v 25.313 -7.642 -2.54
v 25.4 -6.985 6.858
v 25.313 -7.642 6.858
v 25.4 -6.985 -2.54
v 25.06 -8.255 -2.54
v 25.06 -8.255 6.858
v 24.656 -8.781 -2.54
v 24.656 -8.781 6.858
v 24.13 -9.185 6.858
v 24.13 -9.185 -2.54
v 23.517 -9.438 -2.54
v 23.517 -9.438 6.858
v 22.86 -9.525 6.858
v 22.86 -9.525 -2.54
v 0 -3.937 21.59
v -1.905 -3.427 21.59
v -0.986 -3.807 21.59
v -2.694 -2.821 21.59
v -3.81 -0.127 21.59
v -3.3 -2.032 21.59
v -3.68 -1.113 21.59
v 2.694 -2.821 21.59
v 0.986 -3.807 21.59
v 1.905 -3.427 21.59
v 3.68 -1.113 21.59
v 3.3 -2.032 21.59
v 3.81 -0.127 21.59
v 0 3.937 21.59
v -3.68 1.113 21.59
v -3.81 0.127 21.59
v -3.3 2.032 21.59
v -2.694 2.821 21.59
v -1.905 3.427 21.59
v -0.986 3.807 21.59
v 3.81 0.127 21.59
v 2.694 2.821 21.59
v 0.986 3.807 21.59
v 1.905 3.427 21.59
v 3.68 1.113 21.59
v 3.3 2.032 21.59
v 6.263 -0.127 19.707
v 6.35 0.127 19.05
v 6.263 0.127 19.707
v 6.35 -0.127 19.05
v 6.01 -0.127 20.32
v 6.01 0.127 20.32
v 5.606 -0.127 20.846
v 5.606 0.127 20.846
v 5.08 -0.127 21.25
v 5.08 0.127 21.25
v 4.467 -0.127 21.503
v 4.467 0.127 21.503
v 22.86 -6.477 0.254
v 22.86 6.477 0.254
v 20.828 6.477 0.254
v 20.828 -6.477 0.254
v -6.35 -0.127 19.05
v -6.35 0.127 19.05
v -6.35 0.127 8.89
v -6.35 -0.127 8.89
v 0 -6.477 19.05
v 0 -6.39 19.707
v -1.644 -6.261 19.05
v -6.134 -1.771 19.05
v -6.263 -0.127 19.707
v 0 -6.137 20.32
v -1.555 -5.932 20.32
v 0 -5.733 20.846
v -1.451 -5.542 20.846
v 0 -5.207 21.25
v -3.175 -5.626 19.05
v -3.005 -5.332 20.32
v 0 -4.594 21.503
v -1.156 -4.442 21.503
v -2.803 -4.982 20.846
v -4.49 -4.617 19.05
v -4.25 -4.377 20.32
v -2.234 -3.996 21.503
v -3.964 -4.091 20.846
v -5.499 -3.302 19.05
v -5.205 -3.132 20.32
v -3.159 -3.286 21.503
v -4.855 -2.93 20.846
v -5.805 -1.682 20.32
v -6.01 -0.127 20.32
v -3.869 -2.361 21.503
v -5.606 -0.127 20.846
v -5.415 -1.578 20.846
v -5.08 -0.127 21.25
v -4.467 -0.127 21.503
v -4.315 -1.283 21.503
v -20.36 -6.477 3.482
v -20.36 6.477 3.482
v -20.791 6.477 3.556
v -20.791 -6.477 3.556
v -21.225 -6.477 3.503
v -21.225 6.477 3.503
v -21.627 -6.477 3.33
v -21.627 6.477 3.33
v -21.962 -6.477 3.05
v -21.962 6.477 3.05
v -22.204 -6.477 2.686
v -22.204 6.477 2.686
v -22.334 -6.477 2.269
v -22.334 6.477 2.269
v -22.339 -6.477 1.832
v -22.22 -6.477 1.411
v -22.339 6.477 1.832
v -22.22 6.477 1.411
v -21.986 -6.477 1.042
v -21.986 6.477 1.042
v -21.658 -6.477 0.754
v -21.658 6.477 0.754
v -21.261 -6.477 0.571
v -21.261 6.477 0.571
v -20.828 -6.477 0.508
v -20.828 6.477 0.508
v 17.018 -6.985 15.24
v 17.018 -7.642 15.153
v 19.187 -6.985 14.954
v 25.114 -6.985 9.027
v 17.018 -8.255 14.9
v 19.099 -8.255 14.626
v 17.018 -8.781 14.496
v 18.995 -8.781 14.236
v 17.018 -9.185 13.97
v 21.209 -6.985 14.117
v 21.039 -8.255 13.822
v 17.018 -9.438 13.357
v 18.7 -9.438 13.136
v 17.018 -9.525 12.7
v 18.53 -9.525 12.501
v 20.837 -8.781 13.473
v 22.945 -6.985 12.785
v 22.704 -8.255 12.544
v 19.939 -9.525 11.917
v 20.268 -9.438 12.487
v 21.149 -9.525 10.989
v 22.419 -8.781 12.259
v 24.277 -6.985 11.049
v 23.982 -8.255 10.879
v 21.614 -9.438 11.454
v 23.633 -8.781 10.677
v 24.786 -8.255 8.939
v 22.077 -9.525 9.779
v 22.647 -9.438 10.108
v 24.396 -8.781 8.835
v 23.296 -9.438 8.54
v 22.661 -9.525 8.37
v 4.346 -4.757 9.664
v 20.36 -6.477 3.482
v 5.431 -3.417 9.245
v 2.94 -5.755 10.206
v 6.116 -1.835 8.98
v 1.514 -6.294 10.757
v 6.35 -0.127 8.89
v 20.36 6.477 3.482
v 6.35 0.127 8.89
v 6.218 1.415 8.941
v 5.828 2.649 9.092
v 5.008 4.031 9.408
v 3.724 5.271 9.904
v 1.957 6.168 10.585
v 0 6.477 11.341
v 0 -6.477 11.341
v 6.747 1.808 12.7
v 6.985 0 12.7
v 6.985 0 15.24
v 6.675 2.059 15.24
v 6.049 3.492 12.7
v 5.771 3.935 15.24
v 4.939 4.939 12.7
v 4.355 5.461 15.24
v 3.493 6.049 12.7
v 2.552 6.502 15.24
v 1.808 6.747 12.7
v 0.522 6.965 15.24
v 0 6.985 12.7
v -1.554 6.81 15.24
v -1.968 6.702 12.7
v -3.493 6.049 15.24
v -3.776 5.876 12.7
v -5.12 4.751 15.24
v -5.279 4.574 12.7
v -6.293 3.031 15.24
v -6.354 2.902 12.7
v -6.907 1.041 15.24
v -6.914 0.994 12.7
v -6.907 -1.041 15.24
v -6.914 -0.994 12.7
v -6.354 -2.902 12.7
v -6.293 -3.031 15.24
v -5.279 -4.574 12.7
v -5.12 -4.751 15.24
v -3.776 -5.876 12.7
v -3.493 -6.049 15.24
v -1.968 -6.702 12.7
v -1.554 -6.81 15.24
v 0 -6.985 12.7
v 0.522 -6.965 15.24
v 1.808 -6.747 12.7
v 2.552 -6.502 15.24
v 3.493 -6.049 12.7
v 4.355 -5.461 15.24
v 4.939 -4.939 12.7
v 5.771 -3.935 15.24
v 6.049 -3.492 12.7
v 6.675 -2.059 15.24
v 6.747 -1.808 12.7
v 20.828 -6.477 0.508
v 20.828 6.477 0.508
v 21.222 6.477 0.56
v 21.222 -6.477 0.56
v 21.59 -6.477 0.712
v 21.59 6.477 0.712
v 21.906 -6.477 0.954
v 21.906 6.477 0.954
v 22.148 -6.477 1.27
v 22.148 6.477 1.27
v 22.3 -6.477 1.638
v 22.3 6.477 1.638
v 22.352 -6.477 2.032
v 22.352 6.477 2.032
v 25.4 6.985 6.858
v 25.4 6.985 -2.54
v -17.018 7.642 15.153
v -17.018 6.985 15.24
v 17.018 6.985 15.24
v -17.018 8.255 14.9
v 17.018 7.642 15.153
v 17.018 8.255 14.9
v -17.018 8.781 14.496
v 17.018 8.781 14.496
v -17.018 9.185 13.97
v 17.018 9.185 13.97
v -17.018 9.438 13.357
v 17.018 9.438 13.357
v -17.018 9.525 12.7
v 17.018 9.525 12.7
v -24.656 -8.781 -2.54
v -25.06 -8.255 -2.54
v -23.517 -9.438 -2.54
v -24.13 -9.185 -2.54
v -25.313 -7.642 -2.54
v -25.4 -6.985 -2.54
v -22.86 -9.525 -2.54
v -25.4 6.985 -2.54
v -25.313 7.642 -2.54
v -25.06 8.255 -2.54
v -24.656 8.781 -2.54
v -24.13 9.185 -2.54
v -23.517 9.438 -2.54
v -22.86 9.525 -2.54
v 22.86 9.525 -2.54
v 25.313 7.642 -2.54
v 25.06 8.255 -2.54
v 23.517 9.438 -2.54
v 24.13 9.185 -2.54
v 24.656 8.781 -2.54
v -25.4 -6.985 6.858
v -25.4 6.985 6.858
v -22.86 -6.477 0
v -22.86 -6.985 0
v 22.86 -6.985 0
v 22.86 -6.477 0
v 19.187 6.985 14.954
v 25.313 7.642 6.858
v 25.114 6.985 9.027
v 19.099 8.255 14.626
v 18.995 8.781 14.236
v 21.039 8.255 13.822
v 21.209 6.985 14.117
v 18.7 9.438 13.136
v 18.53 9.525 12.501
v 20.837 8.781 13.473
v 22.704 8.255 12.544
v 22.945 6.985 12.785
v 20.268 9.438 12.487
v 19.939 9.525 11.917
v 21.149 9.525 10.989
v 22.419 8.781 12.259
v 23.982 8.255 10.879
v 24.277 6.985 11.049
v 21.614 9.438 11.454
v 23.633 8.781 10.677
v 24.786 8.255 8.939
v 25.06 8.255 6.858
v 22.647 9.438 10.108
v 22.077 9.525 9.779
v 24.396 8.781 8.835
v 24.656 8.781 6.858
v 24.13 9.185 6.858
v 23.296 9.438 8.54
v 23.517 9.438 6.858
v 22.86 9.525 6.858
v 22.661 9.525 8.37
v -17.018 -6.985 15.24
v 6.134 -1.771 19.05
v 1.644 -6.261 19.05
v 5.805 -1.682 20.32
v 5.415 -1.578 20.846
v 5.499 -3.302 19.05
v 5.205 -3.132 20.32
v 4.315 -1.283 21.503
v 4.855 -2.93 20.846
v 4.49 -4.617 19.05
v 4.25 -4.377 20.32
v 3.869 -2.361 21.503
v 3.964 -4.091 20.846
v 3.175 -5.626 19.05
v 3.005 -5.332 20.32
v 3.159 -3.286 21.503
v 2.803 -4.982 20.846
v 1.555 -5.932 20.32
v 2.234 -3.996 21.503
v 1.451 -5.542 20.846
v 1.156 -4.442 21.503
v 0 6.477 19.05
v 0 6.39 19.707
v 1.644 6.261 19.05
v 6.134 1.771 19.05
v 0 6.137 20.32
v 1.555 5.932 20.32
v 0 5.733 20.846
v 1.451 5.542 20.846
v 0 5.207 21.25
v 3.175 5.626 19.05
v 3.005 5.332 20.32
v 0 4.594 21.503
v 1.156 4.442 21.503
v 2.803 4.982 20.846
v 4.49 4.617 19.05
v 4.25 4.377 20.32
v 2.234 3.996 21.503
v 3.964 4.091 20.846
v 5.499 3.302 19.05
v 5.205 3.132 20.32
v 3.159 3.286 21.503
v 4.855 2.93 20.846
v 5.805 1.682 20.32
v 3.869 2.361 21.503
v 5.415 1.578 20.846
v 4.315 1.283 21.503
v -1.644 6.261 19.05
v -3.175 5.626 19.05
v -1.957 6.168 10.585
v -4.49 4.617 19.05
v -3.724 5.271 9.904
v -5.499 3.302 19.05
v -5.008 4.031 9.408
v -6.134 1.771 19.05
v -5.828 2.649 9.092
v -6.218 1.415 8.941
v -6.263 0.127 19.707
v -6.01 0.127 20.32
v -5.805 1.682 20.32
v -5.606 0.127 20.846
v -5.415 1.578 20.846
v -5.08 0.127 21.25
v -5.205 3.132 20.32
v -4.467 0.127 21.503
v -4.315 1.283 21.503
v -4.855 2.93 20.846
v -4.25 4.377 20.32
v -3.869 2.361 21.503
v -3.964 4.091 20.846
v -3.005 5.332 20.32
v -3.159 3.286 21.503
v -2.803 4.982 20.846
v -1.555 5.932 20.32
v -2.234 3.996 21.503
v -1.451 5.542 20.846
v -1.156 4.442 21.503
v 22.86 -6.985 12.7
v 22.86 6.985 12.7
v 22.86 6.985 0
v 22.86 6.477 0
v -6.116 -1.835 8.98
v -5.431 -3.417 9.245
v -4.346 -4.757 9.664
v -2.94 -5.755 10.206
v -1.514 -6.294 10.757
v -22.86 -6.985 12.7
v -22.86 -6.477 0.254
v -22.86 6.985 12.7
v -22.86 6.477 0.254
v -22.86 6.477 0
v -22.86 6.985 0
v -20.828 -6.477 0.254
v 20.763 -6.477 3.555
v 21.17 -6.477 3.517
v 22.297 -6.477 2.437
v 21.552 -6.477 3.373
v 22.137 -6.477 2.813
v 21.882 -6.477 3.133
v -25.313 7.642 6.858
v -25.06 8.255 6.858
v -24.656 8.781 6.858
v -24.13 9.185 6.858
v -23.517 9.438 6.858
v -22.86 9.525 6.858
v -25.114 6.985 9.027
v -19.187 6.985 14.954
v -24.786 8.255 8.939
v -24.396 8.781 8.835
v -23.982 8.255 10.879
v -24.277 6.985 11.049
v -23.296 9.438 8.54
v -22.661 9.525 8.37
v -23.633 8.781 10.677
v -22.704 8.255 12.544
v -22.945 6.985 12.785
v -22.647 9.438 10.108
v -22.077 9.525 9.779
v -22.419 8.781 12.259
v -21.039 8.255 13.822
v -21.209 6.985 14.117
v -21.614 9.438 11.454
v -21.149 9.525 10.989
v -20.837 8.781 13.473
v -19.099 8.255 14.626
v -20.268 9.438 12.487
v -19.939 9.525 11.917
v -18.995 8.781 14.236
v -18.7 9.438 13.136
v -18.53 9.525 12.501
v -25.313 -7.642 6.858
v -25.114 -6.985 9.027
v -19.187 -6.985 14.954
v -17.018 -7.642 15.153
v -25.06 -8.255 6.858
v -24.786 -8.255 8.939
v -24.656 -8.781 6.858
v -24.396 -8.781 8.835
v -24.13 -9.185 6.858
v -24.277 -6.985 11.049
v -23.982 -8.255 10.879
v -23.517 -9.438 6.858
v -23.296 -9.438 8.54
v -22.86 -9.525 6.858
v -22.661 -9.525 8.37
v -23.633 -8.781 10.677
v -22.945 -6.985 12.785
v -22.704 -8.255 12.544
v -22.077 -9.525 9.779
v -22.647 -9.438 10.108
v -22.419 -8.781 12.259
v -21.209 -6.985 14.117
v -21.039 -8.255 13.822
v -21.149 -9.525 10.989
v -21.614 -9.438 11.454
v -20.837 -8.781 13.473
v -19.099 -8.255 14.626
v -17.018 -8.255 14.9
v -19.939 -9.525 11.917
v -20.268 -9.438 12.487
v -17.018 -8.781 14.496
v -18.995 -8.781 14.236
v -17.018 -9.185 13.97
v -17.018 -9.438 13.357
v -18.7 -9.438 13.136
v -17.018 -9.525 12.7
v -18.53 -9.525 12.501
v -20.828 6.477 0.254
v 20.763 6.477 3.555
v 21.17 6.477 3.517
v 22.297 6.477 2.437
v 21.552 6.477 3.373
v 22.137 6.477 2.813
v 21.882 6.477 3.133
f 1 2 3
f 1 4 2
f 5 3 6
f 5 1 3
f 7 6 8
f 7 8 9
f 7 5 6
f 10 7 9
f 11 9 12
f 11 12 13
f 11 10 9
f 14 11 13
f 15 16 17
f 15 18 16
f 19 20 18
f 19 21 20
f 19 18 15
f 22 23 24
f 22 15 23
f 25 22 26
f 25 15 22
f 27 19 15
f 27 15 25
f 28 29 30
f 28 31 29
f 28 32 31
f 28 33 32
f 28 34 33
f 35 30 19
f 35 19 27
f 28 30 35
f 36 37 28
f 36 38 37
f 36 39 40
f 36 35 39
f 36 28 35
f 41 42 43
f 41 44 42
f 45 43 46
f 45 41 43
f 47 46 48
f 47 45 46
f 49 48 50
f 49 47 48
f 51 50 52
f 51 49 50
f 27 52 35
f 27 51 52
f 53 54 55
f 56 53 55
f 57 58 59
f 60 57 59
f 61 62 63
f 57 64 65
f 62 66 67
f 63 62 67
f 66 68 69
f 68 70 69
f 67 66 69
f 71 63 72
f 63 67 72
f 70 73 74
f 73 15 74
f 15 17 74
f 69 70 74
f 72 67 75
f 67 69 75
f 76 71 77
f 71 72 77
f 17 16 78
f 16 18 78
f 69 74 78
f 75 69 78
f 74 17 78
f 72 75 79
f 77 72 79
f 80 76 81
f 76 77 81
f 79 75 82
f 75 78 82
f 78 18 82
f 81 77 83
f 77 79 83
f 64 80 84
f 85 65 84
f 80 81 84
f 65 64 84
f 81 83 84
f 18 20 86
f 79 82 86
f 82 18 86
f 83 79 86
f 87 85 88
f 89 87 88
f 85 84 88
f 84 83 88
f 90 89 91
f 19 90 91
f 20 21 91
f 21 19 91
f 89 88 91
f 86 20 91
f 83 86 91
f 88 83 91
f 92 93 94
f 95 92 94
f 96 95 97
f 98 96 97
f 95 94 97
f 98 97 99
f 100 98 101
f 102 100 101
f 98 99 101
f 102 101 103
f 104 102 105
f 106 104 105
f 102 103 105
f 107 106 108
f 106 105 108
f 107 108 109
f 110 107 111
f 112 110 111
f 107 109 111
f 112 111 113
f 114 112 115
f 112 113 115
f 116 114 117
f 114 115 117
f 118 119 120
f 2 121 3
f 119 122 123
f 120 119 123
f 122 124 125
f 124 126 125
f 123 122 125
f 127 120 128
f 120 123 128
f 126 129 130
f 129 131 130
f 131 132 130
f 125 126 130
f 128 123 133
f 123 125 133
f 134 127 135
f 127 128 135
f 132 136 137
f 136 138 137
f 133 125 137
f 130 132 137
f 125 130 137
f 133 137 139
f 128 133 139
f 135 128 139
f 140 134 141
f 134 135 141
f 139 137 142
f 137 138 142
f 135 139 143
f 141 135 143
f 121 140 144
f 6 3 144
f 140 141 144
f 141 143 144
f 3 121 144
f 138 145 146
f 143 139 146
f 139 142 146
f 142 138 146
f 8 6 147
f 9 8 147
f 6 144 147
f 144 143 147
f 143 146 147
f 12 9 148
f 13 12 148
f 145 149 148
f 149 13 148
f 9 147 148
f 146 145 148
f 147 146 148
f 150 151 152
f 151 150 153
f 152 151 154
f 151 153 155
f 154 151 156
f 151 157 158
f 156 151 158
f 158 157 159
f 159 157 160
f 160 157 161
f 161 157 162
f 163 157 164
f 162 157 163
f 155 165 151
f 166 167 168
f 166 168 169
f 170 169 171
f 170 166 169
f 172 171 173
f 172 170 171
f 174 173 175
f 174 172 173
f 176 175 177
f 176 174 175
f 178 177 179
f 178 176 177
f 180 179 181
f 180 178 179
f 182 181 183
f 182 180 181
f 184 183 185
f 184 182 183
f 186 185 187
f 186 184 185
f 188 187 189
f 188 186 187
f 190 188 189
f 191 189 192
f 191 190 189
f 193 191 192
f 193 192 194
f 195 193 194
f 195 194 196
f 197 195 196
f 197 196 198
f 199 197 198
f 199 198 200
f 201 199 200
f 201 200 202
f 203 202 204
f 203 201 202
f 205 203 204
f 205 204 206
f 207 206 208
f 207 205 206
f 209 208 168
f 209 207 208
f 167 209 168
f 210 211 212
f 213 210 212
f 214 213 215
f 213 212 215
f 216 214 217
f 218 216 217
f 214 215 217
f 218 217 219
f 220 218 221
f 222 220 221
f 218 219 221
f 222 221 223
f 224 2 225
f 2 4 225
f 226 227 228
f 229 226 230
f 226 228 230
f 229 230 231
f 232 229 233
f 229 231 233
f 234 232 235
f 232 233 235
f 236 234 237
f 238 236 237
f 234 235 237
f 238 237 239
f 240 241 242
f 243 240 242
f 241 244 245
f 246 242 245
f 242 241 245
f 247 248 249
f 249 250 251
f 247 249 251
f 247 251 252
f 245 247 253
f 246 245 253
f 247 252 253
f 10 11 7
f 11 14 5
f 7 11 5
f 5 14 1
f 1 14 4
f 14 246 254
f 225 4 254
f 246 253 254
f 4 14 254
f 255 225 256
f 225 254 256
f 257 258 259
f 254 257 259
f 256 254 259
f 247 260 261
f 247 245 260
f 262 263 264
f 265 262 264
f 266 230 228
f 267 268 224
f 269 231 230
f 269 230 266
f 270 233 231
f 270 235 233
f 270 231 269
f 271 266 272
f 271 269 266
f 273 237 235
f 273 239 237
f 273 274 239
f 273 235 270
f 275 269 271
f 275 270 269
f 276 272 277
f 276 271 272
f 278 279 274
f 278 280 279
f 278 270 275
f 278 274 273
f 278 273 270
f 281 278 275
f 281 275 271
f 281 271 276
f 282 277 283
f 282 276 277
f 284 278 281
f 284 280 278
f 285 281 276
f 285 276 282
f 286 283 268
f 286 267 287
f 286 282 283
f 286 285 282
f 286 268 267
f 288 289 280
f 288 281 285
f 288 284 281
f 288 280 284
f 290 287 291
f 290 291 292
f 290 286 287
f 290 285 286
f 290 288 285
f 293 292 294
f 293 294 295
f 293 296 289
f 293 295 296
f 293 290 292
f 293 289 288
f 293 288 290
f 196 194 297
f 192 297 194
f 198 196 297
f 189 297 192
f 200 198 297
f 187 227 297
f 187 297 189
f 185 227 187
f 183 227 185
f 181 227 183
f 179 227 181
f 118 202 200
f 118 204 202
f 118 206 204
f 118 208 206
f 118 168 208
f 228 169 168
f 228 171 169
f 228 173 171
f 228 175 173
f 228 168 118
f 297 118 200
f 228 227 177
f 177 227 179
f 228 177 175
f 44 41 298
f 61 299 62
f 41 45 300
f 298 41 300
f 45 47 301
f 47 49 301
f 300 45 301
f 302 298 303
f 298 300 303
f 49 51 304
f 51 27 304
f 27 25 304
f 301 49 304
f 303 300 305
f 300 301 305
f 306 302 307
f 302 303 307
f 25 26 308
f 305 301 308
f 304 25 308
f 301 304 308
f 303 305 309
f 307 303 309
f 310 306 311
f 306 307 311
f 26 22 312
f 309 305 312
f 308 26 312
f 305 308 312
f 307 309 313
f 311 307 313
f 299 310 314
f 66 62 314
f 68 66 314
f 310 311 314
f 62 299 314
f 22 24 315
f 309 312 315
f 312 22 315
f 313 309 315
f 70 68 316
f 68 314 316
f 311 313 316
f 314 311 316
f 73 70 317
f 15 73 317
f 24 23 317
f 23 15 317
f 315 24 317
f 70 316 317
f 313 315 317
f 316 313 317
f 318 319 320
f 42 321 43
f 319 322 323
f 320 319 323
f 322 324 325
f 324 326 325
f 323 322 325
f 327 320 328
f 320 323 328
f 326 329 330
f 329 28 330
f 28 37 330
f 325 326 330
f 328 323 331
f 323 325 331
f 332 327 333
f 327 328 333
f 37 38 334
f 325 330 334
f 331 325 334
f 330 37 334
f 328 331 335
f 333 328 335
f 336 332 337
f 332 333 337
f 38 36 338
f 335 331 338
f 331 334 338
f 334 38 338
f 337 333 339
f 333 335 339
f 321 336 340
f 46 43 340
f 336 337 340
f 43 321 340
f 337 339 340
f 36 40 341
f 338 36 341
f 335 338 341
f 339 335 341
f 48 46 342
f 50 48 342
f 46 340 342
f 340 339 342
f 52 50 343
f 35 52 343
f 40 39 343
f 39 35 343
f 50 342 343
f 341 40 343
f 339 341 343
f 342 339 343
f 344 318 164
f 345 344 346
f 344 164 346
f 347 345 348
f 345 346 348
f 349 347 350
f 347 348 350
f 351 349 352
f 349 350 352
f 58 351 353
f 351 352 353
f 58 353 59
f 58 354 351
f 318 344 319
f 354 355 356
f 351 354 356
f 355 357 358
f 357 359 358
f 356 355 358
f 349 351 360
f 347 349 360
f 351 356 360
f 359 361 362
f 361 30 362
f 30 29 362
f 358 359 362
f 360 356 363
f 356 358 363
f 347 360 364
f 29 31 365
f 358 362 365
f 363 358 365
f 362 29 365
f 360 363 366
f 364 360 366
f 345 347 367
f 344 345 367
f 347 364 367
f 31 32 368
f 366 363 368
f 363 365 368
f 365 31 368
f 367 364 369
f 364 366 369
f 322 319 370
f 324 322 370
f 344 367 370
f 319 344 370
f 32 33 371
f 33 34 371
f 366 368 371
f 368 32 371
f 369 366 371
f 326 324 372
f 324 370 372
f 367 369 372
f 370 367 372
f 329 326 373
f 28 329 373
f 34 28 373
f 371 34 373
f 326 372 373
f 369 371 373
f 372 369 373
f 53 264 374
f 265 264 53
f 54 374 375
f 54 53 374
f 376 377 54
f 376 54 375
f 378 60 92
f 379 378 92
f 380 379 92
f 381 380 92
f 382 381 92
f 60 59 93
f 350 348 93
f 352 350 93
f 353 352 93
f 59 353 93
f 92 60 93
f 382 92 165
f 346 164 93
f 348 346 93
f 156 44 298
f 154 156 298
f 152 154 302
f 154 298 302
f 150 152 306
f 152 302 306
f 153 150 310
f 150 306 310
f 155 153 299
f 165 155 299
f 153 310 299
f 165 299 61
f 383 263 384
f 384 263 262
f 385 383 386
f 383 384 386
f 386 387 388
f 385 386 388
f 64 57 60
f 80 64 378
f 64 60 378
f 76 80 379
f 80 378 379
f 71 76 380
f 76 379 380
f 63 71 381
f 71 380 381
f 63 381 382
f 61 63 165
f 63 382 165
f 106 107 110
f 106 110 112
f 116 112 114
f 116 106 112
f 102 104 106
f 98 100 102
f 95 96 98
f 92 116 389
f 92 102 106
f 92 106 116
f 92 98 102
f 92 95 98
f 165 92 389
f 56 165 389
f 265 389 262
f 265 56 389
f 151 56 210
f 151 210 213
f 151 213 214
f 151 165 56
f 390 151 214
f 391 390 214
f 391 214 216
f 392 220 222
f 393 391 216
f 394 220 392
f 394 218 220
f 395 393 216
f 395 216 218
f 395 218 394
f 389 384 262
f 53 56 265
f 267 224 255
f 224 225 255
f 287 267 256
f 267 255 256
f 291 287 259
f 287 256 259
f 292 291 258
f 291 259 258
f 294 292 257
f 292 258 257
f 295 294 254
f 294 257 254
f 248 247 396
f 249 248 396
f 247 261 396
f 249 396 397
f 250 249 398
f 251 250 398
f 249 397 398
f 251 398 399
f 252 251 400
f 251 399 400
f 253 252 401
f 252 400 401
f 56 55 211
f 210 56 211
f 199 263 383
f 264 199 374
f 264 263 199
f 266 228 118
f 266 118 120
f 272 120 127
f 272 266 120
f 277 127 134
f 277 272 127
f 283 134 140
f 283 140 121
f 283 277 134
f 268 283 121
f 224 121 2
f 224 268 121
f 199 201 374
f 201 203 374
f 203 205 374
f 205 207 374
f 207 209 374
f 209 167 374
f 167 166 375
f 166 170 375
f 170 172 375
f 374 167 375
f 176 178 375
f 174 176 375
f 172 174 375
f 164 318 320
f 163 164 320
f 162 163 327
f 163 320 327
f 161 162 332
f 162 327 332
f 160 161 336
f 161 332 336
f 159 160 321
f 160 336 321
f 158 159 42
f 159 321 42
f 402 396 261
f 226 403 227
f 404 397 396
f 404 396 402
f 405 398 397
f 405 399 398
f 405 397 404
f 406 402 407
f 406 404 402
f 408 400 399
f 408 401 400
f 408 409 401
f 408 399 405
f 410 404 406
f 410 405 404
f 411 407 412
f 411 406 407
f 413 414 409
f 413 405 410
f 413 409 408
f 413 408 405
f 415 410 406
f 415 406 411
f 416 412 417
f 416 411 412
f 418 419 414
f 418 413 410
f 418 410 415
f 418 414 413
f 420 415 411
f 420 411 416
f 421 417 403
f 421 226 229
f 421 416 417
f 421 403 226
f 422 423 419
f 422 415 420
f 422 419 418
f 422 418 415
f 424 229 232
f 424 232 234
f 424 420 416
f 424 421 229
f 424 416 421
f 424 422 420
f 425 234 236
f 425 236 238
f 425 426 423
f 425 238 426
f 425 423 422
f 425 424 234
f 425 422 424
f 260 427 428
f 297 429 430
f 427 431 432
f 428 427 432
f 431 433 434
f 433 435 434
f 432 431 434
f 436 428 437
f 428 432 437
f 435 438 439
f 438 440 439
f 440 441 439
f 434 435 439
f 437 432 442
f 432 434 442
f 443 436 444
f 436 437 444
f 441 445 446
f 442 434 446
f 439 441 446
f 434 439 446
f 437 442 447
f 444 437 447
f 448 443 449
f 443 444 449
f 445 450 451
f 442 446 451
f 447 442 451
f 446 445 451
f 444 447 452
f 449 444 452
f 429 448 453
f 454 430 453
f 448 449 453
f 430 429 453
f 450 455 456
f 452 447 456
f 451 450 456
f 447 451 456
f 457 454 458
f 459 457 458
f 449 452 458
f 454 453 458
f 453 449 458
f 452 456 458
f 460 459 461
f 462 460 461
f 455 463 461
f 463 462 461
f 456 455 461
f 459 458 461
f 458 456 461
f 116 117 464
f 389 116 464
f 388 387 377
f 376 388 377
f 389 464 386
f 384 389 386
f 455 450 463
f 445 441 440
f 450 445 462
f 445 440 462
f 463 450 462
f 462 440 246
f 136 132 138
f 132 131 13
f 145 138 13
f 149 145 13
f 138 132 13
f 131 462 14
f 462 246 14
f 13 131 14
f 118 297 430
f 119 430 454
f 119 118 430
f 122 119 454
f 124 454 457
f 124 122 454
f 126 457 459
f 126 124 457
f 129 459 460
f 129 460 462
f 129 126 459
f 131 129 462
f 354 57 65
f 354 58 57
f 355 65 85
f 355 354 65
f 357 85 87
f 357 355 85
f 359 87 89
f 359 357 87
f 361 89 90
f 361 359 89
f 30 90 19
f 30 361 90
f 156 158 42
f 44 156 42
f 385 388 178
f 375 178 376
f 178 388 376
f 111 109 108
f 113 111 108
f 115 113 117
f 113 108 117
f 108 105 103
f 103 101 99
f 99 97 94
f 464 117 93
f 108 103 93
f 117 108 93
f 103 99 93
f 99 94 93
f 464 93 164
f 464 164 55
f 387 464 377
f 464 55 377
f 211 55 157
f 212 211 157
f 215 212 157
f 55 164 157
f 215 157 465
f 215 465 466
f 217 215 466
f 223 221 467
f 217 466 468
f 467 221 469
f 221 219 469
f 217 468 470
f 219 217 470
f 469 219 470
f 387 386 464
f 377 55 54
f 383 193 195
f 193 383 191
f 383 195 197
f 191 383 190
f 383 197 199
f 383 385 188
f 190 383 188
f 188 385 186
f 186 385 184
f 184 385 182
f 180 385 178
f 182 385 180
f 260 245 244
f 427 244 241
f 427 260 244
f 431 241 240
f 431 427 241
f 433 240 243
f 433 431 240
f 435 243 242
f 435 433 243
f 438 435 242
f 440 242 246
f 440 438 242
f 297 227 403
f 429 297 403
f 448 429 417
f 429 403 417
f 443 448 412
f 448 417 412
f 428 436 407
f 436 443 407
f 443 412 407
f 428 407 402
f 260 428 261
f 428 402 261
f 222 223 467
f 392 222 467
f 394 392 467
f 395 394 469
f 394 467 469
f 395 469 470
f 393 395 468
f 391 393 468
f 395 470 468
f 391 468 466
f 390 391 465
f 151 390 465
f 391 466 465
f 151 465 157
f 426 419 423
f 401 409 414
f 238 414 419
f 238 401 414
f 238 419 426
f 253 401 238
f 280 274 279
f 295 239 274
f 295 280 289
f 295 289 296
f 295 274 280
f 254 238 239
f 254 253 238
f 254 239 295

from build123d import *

# Parameters (mm, degrees)
F0_W     = 50.8
F0_H     = 19.05
F0_W_2   = 45.72
F0_H_2   = 13.97
F1_DEPTH = 12.7
F2_W     = 50.8
F2_H     = 19.05
F3_DEPTH = 2.54
F5_START = 0.508
F4_W     = 4.572
F4_H     = 2.794
F4_W_2   = 12.7
F4_H_2   = 5.08
F4_H_3   = 3.81
F5_DEPTH = 12.954
F6_R     = 6.34999
F7_W     = 50.8
F7_H     = 19.05
F7_R     = 6.985
F8_DEPTH = 2.54
F9_R     = 2.54
F10_R    = 8.382
F11_R    = 2.54


# Not quite as in the source:
# - a fillet or chamfer is up to 0.001 mm smaller than in the source, because OpenCascade refuses the exact size


with BuildPart() as f1:
    # F0 (on Top) → F1 (new body)
    with BuildSketch(Plane.XY):
        Rectangle(F0_W, F0_H)
        Rectangle(F0_W_2, F0_H_2, mode=Mode.SUBTRACT)
    extrude(amount=F1_DEPTH)

    # F2 (on face) → F3 (join)
    with BuildSketch(Plane(origin=(0, 0, 0), x_dir=(1, 0, 0), z_dir=(0, 0, -1))):
        Rectangle(F2_W, F2_H)
    extrude(amount=F3_DEPTH)

    # F4 (on face) → F5 (join)
    with BuildSketch(Plane.XZ.offset(-6.985).offset(F5_START)):
        Polygon((-25.4, 0.254), (-25.4, -2.54), (20.828, -2.54), (20.828, 0.254), (-20.828, 0.254), align=None)
        with Locations((23.114, -1.143)):
            Rectangle(F4_W, F4_H)
        with BuildLine():
            Line((-20.828, 0.254), (20.828, 0.254))
            Line((20.828, 0.254), (20.828, 0.508))
            ThreePointArc((20.828, 0.508), (19.7166563034, 0.9891715443), (19.3070802744, 2.1288462099))
            Line((19.3070802744, 2.1288462099), (5.08, 7.62))
            Line((5.08, 7.62), (-5.08, 7.62))
            Line((-5.08, 7.62), (-19.3070802744, 2.1288462099))
            ThreePointArc((-19.3070802744, 2.1288462099), (-19.3047702633, 2.0804475914), (-19.304, 2.032))
            ThreePointArc((-19.304, 2.032), (-19.7503692655, 0.9543692655), (-20.828, 0.508))
            Line((-20.828, 0.508), (-20.828, 0.254))
        make_face()
        with BuildLine():
            ThreePointArc((19.3070802744, 2.1288462099), (19.7166563034, 0.9891715443), (20.828, 0.508))
            Line((20.828, 0.508), (20.828, 2.032))
            Line((20.828, 2.032), (19.558, 2.032))
            Line((19.558, 2.032), (19.3070802744, 2.1288462099))
        make_face()
        with BuildLine():
            Line((20.828, 2.032), (20.828, 0.508))
            ThreePointArc((20.828, 0.508), (21.9056307345, 0.9543692655), (22.352, 2.032))
            ThreePointArc((22.352, 2.032), (21.7251962822, 3.2639151071), (20.3603794867, 3.4824851104))
            Line((20.3603794867, 3.4824851104), (20.828, 3.302))
            Line((20.828, 3.302), (20.828, 2.032))
        make_face()
        with BuildLine():
            ThreePointArc((-20.3603794867, 3.4824851104), (-22.3335091013, 2.2686819509), (-20.828, 0.508))
            Line((-20.828, 0.508), (-20.828, 2.032))
            Line((-20.828, 2.032), (-20.828, 3.302))
            Line((-20.828, 3.302), (-20.3603794867, 3.4824851104))
        make_face()
        with BuildLine():
            Line((-20.828, 2.032), (-20.828, 0.508))
            ThreePointArc((-20.828, 0.508), (-19.7503692655, 0.9543692655), (-19.304, 2.032))
            ThreePointArc((-19.304, 2.032), (-19.3047702633, 2.0804475914), (-19.3070802744, 2.1288462099))
            Line((-19.3070802744, 2.1288462099), (-19.558, 2.032))
            Line((-19.558, 2.032), (-20.828, 2.032))
        make_face()
        with BuildLine():
            Line((19.558, 2.032), (20.828, 2.032))
            Line((20.828, 2.032), (20.828, 3.302))
            Line((20.828, 3.302), (20.3603794867, 3.4824851104))
            ThreePointArc((20.3603794867, 3.4824851104), (19.6252291828, 2.9679051027), (19.3070802744, 2.1288462099))
            Line((19.3070802744, 2.1288462099), (19.558, 2.032))
        make_face()
        with BuildLine():
            Line((5.08, 7.62), (19.3070802744, 2.1288462099))
            ThreePointArc((19.3070802744, 2.1288462099), (19.6252291828, 2.9679051027), (20.3603794867, 3.4824851104))
            Line((20.3603794867, 3.4824851104), (6.35, 8.89))
            Line((6.35, 8.89), (6.35, 7.62))
            Line((6.35, 7.62), (5.08, 7.62))
        make_face()
        with BuildLine():
            Line((-20.828, 3.302), (-20.828, 2.032))
            Line((-20.828, 2.032), (-19.558, 2.032))
            Line((-19.558, 2.032), (-19.3070802744, 2.1288462099))
            ThreePointArc((-19.3070802744, 2.1288462099), (-19.6252291828, 2.9679051027), (-20.3603794867, 3.4824851104))
            Line((-20.3603794867, 3.4824851104), (-20.828, 3.302))
        make_face()
        with BuildLine():
            Line((-6.35, 8.89), (-20.3603794867, 3.4824851104))
            ThreePointArc((-20.3603794867, 3.4824851104), (-19.6252291828, 2.9679051027), (-19.3070802744, 2.1288462099))
            Line((-19.3070802744, 2.1288462099), (-5.08, 7.62))
            Line((-5.08, 7.62), (-6.35, 7.62))
            Line((-6.35, 7.62), (-6.35, 8.89))
        make_face()
        Polygon((-5.08, 7.62), (5.08, 7.62), (6.35, 7.62), (6.35, 8.89), (6.35, 12.7), (-6.35, 12.7), (-6.35, 8.89), (-6.35, 7.62), align=None)
        with Locations((0, 15.24)):
            Rectangle(F4_W_2, F4_H_2)
        with Locations((0, 19.685)):
            Rectangle(F4_W_2, F4_H_3)
    extrude(amount=F5_DEPTH)

    # F6 (radius 6.35 in the source; OpenCascade refuses exactly that, so slightly less here)
    f6_edges = [f1.edges().sort_by_distance(p)[0] for p in [
        (-6.35, -6.477, 15.24),
        (6.35, -6.477, 15.24),
        (6.35, 6.477, 15.24),
        (-6.35, 6.477, 15.24),
    ]]
    fillet(f6_edges, radius=F6_R)

    # F7 (on face) → F8 (join)
    with BuildSketch(Plane.XY.offset(12.7)):
        Rectangle(F7_W, F7_H)
        Circle(F7_R, mode=Mode.SUBTRACT)
    extrude(amount=F8_DEPTH)

    # F9
    f9_edges = [f1.edges().sort_by_distance(p)[0] for p in [
        (4.490131, -4.617131, 21.59),
    ]]
    fillet(f9_edges, radius=F9_R)

    # F10
    f10_edges = [f1.edges().sort_by_distance(p)[0] for p in [
        (25.4, 0, 15.24),
        (-25.4, 0, 15.24),
    ]]
    fillet(f10_edges, radius=F10_R)

    # F11
    f11_edges = [f1.edges().sort_by_distance(p)[0] for p in [
        (0, 9.525, 15.24),
        (0, -9.525, 15.24),
        (-22.944969, -9.525, 12.784969),
        (-22.944969, 9.525, 12.784969),
        (-25.4, 9.525, 2.159),
        (-25.4, -9.525, 2.159),
        (25.4, 9.525, 2.159),
        (22.944969, 9.525, 12.784969),
        (22.944969, -9.525, 12.784969),
        (25.4, -9.525, 2.159),
    ]]
    fillet(f11_edges, radius=F11_R)


solid = f1.part
